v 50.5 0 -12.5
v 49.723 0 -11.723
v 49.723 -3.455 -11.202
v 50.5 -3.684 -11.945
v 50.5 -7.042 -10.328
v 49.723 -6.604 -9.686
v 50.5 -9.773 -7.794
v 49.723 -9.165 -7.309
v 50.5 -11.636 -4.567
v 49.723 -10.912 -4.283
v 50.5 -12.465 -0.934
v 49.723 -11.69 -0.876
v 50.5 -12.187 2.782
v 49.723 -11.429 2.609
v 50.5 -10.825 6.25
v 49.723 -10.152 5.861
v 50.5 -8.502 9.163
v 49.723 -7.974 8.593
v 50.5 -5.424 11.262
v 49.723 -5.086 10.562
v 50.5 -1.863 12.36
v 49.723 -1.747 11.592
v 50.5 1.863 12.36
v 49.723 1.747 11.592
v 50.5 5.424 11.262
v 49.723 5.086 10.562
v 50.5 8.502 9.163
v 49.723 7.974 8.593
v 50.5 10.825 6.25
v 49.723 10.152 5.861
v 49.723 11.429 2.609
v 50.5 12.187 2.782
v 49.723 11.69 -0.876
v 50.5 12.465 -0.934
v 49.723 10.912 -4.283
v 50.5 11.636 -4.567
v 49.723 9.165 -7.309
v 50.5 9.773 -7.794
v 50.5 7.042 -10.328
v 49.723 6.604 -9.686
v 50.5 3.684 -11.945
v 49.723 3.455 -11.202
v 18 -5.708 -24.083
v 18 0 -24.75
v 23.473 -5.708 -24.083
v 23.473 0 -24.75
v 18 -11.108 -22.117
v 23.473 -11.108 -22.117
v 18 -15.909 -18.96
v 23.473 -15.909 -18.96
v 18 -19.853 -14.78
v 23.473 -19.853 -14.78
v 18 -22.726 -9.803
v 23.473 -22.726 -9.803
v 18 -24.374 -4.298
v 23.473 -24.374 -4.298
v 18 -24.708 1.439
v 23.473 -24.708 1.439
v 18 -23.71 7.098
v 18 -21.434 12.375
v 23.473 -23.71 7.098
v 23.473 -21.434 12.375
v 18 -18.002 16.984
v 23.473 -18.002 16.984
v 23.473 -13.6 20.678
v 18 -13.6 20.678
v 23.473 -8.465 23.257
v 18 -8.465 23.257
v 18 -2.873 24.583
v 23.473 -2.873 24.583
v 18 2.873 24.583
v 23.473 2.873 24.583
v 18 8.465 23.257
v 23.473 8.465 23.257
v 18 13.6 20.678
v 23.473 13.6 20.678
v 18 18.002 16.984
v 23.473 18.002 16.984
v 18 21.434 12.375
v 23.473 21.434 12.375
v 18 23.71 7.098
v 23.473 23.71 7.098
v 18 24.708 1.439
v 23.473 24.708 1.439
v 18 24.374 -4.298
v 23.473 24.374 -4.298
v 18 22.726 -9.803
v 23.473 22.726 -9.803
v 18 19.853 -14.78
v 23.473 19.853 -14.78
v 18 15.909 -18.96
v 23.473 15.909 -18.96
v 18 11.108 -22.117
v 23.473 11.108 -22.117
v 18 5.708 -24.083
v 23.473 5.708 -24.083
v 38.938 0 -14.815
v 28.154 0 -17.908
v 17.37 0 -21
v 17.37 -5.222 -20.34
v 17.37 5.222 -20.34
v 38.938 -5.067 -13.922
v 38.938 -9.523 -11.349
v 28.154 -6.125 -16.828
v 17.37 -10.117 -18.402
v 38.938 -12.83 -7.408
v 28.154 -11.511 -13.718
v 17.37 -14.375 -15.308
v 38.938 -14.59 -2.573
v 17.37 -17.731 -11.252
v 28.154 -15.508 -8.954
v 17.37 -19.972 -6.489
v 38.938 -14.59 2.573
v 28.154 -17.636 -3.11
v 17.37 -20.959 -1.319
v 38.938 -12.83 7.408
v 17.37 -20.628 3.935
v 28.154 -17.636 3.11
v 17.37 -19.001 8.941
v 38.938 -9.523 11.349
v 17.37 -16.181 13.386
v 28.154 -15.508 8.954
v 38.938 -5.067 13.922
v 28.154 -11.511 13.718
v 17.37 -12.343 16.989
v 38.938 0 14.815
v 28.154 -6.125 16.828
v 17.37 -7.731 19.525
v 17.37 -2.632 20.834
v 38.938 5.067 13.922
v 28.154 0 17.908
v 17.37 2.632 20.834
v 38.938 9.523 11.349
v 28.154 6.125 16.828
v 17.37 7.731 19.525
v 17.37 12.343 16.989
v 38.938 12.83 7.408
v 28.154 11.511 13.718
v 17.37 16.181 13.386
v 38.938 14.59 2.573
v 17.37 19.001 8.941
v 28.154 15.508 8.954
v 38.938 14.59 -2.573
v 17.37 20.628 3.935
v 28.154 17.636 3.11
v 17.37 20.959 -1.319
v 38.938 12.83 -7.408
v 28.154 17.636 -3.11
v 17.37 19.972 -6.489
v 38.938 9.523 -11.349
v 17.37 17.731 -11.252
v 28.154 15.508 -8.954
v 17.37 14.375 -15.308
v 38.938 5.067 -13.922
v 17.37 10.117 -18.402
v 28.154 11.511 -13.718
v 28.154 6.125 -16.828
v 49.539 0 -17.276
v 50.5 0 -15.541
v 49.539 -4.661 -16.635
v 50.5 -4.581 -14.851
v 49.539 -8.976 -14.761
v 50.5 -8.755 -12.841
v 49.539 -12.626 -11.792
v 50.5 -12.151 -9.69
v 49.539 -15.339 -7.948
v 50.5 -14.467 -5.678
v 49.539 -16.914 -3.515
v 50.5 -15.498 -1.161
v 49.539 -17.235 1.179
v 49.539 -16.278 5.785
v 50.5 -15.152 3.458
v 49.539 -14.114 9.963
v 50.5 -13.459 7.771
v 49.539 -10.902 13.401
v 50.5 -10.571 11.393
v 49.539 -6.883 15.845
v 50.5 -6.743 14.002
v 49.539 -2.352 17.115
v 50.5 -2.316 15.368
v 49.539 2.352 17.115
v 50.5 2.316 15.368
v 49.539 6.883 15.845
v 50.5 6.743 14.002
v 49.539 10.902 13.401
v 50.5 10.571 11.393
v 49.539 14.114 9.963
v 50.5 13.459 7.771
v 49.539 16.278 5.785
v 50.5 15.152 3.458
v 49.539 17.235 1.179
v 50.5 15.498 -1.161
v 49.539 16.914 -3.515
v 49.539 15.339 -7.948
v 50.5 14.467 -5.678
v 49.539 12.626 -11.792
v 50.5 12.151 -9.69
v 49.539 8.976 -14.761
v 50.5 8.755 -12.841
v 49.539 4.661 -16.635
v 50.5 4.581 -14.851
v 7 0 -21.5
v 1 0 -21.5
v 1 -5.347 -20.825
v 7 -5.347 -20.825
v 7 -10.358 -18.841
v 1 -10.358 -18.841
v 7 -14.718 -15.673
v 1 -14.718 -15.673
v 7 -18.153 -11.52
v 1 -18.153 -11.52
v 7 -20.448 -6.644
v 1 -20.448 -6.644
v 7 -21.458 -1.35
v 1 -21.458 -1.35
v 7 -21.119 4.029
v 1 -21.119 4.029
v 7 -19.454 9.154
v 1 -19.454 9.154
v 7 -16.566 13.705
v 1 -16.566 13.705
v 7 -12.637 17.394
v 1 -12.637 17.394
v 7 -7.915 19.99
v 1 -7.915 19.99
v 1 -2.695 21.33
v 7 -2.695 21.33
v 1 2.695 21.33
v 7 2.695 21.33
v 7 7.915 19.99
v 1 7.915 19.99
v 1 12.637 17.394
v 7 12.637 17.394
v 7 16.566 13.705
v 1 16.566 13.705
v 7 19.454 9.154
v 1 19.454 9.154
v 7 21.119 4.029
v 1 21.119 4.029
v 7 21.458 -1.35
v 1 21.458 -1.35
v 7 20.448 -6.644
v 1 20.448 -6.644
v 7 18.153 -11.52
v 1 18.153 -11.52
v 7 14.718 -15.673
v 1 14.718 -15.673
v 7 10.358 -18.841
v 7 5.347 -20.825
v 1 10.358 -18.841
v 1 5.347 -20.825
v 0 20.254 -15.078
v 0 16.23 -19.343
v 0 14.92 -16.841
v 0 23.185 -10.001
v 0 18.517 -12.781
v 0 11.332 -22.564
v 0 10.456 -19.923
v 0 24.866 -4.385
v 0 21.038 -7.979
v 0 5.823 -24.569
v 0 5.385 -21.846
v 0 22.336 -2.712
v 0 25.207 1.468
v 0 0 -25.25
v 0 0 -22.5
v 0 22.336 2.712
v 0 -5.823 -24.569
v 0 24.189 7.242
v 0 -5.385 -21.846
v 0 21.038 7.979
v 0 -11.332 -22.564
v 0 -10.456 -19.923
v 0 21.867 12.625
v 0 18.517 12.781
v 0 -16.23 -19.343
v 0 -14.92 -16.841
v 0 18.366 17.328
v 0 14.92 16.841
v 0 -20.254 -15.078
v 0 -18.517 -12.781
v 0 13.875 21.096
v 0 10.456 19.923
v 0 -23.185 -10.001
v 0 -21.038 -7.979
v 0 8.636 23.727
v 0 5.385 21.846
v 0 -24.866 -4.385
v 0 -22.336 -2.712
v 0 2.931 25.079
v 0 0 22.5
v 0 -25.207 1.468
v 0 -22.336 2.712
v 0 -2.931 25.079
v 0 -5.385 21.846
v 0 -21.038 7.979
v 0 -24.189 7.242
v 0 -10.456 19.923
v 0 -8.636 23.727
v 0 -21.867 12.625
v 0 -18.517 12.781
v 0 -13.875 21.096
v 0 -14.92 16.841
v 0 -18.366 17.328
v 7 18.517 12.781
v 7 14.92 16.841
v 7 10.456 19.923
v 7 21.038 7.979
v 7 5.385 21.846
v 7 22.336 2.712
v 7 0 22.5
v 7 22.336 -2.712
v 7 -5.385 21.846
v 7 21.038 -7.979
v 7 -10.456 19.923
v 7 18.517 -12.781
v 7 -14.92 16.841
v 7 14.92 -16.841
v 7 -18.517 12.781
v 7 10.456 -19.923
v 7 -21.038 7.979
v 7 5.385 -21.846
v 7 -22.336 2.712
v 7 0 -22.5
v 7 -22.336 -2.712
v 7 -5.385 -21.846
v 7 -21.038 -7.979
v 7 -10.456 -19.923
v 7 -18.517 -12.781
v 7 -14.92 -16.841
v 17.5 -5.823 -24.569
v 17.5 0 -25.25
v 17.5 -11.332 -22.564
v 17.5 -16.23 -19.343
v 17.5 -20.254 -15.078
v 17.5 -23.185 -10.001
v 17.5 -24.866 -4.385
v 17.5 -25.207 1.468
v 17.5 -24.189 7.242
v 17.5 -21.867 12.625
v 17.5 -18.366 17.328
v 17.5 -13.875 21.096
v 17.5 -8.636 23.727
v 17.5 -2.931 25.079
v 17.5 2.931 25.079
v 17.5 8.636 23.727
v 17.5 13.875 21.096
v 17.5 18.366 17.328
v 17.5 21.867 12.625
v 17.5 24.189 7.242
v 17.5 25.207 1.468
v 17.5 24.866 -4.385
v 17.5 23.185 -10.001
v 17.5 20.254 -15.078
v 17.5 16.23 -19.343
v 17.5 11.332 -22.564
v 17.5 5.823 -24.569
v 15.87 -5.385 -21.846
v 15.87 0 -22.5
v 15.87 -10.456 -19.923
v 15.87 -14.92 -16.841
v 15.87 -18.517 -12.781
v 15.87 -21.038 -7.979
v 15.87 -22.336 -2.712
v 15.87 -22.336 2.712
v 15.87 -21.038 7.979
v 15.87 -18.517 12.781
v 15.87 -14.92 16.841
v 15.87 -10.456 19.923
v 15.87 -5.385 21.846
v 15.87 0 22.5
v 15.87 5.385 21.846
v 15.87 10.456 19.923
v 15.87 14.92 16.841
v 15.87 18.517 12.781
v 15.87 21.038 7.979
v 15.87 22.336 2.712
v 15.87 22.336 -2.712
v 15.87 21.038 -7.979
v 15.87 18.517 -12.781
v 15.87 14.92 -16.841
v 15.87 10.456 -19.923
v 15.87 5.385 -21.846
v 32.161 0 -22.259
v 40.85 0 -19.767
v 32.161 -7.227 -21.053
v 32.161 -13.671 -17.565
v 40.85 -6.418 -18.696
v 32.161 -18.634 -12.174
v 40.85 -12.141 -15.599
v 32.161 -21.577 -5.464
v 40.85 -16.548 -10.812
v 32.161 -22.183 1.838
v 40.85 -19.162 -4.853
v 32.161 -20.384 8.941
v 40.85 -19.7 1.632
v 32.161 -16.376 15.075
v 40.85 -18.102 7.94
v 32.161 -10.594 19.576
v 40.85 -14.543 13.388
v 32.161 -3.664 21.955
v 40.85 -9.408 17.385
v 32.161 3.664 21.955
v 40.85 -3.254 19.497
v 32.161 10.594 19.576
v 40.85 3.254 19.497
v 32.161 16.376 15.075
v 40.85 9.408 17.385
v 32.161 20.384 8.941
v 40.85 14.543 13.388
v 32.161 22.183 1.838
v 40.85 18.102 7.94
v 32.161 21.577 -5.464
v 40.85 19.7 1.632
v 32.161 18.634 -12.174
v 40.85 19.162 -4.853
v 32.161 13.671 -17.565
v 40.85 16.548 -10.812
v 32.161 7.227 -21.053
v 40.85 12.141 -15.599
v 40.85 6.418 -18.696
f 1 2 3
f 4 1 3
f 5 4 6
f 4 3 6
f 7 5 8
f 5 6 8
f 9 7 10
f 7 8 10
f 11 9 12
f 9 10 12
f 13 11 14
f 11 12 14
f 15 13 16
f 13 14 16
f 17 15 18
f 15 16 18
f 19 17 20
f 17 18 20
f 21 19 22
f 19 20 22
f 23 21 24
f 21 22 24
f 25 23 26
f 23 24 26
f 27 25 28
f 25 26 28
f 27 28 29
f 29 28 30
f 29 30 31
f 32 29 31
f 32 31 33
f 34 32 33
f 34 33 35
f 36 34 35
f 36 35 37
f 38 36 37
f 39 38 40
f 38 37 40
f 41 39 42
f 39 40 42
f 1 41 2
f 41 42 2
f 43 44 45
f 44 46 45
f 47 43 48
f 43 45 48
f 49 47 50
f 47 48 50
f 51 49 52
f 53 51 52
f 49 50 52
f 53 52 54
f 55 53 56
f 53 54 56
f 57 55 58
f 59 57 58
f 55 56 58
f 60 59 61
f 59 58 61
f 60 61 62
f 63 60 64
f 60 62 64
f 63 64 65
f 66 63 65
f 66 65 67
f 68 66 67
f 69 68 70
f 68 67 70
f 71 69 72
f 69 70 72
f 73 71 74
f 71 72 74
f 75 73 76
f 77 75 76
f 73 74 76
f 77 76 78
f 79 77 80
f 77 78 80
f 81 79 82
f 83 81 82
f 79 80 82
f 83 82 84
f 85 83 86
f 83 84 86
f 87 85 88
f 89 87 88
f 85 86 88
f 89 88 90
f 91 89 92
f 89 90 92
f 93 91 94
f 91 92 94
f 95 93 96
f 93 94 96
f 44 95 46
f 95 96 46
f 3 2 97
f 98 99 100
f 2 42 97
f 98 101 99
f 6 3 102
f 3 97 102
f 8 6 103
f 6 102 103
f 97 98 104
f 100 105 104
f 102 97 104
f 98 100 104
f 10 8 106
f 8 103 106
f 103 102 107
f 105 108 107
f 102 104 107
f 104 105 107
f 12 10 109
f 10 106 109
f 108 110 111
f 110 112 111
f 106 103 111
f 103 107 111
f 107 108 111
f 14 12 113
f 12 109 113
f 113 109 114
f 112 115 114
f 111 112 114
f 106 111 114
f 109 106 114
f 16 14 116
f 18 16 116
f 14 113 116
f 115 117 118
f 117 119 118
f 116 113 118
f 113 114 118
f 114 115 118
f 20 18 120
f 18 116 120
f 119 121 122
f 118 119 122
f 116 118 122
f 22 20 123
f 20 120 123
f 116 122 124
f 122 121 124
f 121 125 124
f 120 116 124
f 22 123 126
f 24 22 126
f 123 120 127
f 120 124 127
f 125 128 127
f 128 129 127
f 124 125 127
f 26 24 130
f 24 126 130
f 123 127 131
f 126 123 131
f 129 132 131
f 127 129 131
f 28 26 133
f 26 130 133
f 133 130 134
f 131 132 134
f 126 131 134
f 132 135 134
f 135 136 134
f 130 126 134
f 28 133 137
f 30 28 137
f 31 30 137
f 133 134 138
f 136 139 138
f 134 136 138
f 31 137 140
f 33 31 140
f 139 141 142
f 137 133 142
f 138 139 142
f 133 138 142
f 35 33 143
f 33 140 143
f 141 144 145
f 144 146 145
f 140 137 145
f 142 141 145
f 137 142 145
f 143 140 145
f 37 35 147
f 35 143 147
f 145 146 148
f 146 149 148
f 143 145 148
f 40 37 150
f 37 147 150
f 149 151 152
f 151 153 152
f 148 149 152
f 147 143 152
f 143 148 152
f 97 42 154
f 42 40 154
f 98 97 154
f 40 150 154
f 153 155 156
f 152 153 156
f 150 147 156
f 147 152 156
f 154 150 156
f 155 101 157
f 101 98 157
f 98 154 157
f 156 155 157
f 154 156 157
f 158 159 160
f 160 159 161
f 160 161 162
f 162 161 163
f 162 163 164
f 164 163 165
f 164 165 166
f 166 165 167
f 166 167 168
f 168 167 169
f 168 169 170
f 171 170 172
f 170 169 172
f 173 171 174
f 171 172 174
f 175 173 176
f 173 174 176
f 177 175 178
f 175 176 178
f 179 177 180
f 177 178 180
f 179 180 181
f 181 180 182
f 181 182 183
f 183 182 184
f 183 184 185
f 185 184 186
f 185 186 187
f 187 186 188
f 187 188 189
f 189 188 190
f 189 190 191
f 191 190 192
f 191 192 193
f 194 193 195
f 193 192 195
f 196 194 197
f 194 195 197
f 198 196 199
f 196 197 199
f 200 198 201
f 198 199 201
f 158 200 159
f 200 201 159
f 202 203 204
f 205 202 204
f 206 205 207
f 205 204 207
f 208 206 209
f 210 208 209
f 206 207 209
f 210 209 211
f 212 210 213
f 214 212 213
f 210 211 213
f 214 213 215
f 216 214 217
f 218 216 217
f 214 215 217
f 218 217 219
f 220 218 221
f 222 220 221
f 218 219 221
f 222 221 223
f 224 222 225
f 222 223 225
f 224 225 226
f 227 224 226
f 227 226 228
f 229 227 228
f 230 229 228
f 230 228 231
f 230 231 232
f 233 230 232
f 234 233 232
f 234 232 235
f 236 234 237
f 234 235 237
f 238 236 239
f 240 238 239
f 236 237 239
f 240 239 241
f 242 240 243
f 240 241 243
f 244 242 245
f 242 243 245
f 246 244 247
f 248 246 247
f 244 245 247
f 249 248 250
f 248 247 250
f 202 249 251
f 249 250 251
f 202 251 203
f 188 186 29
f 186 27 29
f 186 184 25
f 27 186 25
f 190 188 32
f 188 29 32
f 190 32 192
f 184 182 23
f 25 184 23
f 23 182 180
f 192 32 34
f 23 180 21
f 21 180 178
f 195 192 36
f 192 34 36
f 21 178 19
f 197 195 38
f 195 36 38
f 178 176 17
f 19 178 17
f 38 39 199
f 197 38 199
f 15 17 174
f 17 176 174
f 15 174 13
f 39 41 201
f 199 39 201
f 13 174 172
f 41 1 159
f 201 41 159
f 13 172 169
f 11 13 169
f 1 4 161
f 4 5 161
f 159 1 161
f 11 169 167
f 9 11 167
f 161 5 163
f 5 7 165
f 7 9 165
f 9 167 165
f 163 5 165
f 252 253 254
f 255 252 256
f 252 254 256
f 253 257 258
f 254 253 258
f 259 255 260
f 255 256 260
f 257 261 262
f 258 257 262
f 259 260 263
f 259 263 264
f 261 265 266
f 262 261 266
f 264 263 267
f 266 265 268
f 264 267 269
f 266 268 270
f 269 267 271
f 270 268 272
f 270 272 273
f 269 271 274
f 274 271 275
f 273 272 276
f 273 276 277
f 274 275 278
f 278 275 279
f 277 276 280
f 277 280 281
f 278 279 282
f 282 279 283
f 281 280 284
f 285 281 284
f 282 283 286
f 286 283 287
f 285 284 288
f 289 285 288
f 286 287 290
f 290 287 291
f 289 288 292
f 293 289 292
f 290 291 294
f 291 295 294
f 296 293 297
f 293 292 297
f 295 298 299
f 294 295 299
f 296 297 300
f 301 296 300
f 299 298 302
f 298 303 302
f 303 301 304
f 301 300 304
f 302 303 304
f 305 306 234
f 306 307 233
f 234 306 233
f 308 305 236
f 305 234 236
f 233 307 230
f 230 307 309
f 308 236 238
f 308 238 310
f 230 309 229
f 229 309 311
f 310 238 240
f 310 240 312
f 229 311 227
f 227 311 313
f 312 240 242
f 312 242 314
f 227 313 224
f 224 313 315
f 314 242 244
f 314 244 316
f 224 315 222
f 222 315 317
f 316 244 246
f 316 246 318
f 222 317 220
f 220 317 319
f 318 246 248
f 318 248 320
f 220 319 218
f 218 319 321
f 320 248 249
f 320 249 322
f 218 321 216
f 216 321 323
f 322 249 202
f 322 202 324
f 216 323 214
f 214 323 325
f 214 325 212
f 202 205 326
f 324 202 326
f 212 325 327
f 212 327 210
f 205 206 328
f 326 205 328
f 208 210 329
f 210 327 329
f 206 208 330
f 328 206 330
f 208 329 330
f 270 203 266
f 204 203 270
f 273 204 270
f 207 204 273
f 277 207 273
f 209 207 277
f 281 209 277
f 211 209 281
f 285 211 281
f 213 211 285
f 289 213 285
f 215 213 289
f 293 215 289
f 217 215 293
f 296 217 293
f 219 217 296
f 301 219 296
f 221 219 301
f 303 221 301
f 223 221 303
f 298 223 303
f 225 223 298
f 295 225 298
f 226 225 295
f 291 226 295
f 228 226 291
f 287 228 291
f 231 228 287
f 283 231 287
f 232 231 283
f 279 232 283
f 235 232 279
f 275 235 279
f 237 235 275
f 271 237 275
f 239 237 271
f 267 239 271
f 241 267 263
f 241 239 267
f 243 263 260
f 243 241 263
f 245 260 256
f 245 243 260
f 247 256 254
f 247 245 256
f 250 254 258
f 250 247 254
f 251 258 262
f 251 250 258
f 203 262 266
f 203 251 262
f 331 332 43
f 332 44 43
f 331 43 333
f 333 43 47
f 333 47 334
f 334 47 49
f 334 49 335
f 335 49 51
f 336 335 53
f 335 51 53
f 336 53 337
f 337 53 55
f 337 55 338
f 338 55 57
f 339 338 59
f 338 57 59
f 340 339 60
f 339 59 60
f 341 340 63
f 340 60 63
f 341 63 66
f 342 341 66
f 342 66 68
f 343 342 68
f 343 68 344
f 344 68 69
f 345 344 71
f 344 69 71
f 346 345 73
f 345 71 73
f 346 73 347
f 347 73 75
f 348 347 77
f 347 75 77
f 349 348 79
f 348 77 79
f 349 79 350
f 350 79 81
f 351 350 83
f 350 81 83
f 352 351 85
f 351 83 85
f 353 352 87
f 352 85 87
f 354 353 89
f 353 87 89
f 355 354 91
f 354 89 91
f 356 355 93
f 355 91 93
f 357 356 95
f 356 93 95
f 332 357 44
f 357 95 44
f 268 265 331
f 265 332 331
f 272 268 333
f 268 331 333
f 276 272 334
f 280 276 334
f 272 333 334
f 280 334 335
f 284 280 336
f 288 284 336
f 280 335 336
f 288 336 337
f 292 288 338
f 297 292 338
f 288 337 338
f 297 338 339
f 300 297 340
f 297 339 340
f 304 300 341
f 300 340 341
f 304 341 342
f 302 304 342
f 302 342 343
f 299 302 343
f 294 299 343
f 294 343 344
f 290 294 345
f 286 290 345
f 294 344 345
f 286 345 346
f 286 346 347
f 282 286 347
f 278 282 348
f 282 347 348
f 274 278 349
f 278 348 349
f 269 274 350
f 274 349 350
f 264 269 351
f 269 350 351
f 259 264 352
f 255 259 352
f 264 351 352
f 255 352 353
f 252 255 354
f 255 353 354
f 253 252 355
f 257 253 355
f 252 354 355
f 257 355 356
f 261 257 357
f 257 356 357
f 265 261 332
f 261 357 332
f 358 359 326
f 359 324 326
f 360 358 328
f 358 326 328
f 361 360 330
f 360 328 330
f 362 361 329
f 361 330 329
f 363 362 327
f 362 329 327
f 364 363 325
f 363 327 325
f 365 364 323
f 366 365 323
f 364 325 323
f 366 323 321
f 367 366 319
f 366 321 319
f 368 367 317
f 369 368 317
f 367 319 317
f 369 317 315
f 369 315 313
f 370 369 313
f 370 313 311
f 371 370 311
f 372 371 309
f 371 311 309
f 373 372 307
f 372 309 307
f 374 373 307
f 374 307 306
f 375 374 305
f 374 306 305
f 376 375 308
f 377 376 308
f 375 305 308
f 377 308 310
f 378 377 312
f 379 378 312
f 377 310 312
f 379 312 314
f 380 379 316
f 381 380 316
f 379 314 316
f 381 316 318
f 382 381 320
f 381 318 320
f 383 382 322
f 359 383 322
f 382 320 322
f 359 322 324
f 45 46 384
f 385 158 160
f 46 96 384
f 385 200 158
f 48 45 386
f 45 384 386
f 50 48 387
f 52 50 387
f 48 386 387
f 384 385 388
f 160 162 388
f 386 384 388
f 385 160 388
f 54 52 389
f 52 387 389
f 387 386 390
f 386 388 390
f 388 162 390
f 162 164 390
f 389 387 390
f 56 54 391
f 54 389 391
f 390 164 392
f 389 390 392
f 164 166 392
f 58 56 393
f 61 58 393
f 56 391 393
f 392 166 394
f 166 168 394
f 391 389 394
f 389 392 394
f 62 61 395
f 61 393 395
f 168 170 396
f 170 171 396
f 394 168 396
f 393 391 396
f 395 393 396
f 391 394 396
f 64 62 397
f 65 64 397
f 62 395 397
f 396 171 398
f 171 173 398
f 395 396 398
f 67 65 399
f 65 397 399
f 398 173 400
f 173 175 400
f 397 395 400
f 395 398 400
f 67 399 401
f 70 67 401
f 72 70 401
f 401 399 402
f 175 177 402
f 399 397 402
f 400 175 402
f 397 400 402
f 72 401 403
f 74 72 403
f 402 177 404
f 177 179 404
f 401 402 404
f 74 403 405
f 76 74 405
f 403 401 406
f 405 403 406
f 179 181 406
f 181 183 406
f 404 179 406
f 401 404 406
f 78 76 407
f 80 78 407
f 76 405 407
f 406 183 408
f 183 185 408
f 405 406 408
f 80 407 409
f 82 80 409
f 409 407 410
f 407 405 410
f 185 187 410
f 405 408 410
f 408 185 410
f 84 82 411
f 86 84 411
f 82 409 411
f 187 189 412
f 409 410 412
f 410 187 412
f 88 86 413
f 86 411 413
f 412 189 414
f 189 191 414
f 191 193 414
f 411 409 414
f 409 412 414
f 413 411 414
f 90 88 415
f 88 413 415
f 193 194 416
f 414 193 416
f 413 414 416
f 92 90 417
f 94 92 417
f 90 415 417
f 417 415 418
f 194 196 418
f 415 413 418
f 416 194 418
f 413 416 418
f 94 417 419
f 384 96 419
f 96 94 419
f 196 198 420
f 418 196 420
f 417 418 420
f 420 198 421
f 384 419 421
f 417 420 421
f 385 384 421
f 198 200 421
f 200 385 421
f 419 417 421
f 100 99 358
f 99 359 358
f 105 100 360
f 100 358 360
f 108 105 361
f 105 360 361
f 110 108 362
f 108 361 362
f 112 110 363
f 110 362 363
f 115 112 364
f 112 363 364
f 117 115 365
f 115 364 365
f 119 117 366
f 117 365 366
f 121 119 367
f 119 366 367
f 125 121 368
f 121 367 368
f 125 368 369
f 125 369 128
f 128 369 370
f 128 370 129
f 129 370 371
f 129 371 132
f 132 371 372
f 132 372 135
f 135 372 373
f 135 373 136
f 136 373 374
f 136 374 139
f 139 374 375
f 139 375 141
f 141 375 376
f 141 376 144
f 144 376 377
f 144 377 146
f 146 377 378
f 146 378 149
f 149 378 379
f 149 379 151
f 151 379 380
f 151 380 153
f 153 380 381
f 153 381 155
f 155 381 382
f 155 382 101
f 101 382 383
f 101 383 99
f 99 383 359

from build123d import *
from OCP.BRepFilletAPI import BRepFilletAPI_MakeChamfer

# Parameters (mm, degrees)
CHANFREIN1_SIZE    = 1
CHANFREIN1_SIZE2   = 0.808473415
CHANFREIN1_SIZE2_2 = 1.458524649


with BuildPart() as part:
    # Esquisse1 → Révolution1 (revolve)
    with BuildSketch(Plane.XY, mode=Mode.PRIVATE) as r_volution1_sk:
        Polygon((0, 21.5), (0, 25.25), (17.5, 25.25), (18, 24.75), (23.47253806, 24.75), (50.5, 17), (50.5, 11.5), (17.369562784, 21), (15.869562784, 22.5), (7, 22.5), (7, 21.5), align=None)
    revolve(r_volution1_sk.sketch.rotate(Axis((0, 0, 0), (-1, 0, 0)), 90), axis=Axis((0, 0, 0), (-1, 0, 0)))

    # Chanfrein1: one chamfer whose edges measure the first distance from different faces: ONE call of the kernel's chamfer builder (chamfer() names one face for all edges)
    chanfrein1_edges_1 = [part.edges().sort_by_distance(p)[0] for p in [
        (0, 0, 21.5),
    ]]
    chanfrein1_edges_2 = [part.edges().sort_by_distance(p)[0] for p in [
        (50.5, 0, 11.5),
    ]]
    chanfrein1_side_2 = [part.faces().sort_by_distance(p)[0] for p in [
        (50.5, 0, 16.519167389),
    ]]
    chanfrein1_edges_3 = [part.edges().sort_by_distance(p)[0] for p in [
        (50.5, 0, 17),
    ]]
    chanfrein1_side_3 = [part.faces().sort_by_distance(p)[0] for p in [
        (36.98626903, 0, 20.875),
    ]]
    chanfrein1 = BRepFilletAPI_MakeChamfer(part.part.solid().wrapped)
    for e in chanfrein1_edges_1:
        chanfrein1.Add(CHANFREIN1_SIZE, e.wrapped)
    for e in chanfrein1_edges_2:
        chanfrein1.Add(CHANFREIN1_SIZE, CHANFREIN1_SIZE2, e.wrapped, chanfrein1_side_2[0].wrapped)  # the first distance lies on this face
    for e in chanfrein1_edges_3:
        chanfrein1.Add(CHANFREIN1_SIZE, CHANFREIN1_SIZE2_2, e.wrapped, chanfrein1_side_3[0].wrapped)  # the first distance lies on this face
    add(Compound.cast(chanfrein1.Shape()), mode=Mode.REPLACE)


solid = part.part
